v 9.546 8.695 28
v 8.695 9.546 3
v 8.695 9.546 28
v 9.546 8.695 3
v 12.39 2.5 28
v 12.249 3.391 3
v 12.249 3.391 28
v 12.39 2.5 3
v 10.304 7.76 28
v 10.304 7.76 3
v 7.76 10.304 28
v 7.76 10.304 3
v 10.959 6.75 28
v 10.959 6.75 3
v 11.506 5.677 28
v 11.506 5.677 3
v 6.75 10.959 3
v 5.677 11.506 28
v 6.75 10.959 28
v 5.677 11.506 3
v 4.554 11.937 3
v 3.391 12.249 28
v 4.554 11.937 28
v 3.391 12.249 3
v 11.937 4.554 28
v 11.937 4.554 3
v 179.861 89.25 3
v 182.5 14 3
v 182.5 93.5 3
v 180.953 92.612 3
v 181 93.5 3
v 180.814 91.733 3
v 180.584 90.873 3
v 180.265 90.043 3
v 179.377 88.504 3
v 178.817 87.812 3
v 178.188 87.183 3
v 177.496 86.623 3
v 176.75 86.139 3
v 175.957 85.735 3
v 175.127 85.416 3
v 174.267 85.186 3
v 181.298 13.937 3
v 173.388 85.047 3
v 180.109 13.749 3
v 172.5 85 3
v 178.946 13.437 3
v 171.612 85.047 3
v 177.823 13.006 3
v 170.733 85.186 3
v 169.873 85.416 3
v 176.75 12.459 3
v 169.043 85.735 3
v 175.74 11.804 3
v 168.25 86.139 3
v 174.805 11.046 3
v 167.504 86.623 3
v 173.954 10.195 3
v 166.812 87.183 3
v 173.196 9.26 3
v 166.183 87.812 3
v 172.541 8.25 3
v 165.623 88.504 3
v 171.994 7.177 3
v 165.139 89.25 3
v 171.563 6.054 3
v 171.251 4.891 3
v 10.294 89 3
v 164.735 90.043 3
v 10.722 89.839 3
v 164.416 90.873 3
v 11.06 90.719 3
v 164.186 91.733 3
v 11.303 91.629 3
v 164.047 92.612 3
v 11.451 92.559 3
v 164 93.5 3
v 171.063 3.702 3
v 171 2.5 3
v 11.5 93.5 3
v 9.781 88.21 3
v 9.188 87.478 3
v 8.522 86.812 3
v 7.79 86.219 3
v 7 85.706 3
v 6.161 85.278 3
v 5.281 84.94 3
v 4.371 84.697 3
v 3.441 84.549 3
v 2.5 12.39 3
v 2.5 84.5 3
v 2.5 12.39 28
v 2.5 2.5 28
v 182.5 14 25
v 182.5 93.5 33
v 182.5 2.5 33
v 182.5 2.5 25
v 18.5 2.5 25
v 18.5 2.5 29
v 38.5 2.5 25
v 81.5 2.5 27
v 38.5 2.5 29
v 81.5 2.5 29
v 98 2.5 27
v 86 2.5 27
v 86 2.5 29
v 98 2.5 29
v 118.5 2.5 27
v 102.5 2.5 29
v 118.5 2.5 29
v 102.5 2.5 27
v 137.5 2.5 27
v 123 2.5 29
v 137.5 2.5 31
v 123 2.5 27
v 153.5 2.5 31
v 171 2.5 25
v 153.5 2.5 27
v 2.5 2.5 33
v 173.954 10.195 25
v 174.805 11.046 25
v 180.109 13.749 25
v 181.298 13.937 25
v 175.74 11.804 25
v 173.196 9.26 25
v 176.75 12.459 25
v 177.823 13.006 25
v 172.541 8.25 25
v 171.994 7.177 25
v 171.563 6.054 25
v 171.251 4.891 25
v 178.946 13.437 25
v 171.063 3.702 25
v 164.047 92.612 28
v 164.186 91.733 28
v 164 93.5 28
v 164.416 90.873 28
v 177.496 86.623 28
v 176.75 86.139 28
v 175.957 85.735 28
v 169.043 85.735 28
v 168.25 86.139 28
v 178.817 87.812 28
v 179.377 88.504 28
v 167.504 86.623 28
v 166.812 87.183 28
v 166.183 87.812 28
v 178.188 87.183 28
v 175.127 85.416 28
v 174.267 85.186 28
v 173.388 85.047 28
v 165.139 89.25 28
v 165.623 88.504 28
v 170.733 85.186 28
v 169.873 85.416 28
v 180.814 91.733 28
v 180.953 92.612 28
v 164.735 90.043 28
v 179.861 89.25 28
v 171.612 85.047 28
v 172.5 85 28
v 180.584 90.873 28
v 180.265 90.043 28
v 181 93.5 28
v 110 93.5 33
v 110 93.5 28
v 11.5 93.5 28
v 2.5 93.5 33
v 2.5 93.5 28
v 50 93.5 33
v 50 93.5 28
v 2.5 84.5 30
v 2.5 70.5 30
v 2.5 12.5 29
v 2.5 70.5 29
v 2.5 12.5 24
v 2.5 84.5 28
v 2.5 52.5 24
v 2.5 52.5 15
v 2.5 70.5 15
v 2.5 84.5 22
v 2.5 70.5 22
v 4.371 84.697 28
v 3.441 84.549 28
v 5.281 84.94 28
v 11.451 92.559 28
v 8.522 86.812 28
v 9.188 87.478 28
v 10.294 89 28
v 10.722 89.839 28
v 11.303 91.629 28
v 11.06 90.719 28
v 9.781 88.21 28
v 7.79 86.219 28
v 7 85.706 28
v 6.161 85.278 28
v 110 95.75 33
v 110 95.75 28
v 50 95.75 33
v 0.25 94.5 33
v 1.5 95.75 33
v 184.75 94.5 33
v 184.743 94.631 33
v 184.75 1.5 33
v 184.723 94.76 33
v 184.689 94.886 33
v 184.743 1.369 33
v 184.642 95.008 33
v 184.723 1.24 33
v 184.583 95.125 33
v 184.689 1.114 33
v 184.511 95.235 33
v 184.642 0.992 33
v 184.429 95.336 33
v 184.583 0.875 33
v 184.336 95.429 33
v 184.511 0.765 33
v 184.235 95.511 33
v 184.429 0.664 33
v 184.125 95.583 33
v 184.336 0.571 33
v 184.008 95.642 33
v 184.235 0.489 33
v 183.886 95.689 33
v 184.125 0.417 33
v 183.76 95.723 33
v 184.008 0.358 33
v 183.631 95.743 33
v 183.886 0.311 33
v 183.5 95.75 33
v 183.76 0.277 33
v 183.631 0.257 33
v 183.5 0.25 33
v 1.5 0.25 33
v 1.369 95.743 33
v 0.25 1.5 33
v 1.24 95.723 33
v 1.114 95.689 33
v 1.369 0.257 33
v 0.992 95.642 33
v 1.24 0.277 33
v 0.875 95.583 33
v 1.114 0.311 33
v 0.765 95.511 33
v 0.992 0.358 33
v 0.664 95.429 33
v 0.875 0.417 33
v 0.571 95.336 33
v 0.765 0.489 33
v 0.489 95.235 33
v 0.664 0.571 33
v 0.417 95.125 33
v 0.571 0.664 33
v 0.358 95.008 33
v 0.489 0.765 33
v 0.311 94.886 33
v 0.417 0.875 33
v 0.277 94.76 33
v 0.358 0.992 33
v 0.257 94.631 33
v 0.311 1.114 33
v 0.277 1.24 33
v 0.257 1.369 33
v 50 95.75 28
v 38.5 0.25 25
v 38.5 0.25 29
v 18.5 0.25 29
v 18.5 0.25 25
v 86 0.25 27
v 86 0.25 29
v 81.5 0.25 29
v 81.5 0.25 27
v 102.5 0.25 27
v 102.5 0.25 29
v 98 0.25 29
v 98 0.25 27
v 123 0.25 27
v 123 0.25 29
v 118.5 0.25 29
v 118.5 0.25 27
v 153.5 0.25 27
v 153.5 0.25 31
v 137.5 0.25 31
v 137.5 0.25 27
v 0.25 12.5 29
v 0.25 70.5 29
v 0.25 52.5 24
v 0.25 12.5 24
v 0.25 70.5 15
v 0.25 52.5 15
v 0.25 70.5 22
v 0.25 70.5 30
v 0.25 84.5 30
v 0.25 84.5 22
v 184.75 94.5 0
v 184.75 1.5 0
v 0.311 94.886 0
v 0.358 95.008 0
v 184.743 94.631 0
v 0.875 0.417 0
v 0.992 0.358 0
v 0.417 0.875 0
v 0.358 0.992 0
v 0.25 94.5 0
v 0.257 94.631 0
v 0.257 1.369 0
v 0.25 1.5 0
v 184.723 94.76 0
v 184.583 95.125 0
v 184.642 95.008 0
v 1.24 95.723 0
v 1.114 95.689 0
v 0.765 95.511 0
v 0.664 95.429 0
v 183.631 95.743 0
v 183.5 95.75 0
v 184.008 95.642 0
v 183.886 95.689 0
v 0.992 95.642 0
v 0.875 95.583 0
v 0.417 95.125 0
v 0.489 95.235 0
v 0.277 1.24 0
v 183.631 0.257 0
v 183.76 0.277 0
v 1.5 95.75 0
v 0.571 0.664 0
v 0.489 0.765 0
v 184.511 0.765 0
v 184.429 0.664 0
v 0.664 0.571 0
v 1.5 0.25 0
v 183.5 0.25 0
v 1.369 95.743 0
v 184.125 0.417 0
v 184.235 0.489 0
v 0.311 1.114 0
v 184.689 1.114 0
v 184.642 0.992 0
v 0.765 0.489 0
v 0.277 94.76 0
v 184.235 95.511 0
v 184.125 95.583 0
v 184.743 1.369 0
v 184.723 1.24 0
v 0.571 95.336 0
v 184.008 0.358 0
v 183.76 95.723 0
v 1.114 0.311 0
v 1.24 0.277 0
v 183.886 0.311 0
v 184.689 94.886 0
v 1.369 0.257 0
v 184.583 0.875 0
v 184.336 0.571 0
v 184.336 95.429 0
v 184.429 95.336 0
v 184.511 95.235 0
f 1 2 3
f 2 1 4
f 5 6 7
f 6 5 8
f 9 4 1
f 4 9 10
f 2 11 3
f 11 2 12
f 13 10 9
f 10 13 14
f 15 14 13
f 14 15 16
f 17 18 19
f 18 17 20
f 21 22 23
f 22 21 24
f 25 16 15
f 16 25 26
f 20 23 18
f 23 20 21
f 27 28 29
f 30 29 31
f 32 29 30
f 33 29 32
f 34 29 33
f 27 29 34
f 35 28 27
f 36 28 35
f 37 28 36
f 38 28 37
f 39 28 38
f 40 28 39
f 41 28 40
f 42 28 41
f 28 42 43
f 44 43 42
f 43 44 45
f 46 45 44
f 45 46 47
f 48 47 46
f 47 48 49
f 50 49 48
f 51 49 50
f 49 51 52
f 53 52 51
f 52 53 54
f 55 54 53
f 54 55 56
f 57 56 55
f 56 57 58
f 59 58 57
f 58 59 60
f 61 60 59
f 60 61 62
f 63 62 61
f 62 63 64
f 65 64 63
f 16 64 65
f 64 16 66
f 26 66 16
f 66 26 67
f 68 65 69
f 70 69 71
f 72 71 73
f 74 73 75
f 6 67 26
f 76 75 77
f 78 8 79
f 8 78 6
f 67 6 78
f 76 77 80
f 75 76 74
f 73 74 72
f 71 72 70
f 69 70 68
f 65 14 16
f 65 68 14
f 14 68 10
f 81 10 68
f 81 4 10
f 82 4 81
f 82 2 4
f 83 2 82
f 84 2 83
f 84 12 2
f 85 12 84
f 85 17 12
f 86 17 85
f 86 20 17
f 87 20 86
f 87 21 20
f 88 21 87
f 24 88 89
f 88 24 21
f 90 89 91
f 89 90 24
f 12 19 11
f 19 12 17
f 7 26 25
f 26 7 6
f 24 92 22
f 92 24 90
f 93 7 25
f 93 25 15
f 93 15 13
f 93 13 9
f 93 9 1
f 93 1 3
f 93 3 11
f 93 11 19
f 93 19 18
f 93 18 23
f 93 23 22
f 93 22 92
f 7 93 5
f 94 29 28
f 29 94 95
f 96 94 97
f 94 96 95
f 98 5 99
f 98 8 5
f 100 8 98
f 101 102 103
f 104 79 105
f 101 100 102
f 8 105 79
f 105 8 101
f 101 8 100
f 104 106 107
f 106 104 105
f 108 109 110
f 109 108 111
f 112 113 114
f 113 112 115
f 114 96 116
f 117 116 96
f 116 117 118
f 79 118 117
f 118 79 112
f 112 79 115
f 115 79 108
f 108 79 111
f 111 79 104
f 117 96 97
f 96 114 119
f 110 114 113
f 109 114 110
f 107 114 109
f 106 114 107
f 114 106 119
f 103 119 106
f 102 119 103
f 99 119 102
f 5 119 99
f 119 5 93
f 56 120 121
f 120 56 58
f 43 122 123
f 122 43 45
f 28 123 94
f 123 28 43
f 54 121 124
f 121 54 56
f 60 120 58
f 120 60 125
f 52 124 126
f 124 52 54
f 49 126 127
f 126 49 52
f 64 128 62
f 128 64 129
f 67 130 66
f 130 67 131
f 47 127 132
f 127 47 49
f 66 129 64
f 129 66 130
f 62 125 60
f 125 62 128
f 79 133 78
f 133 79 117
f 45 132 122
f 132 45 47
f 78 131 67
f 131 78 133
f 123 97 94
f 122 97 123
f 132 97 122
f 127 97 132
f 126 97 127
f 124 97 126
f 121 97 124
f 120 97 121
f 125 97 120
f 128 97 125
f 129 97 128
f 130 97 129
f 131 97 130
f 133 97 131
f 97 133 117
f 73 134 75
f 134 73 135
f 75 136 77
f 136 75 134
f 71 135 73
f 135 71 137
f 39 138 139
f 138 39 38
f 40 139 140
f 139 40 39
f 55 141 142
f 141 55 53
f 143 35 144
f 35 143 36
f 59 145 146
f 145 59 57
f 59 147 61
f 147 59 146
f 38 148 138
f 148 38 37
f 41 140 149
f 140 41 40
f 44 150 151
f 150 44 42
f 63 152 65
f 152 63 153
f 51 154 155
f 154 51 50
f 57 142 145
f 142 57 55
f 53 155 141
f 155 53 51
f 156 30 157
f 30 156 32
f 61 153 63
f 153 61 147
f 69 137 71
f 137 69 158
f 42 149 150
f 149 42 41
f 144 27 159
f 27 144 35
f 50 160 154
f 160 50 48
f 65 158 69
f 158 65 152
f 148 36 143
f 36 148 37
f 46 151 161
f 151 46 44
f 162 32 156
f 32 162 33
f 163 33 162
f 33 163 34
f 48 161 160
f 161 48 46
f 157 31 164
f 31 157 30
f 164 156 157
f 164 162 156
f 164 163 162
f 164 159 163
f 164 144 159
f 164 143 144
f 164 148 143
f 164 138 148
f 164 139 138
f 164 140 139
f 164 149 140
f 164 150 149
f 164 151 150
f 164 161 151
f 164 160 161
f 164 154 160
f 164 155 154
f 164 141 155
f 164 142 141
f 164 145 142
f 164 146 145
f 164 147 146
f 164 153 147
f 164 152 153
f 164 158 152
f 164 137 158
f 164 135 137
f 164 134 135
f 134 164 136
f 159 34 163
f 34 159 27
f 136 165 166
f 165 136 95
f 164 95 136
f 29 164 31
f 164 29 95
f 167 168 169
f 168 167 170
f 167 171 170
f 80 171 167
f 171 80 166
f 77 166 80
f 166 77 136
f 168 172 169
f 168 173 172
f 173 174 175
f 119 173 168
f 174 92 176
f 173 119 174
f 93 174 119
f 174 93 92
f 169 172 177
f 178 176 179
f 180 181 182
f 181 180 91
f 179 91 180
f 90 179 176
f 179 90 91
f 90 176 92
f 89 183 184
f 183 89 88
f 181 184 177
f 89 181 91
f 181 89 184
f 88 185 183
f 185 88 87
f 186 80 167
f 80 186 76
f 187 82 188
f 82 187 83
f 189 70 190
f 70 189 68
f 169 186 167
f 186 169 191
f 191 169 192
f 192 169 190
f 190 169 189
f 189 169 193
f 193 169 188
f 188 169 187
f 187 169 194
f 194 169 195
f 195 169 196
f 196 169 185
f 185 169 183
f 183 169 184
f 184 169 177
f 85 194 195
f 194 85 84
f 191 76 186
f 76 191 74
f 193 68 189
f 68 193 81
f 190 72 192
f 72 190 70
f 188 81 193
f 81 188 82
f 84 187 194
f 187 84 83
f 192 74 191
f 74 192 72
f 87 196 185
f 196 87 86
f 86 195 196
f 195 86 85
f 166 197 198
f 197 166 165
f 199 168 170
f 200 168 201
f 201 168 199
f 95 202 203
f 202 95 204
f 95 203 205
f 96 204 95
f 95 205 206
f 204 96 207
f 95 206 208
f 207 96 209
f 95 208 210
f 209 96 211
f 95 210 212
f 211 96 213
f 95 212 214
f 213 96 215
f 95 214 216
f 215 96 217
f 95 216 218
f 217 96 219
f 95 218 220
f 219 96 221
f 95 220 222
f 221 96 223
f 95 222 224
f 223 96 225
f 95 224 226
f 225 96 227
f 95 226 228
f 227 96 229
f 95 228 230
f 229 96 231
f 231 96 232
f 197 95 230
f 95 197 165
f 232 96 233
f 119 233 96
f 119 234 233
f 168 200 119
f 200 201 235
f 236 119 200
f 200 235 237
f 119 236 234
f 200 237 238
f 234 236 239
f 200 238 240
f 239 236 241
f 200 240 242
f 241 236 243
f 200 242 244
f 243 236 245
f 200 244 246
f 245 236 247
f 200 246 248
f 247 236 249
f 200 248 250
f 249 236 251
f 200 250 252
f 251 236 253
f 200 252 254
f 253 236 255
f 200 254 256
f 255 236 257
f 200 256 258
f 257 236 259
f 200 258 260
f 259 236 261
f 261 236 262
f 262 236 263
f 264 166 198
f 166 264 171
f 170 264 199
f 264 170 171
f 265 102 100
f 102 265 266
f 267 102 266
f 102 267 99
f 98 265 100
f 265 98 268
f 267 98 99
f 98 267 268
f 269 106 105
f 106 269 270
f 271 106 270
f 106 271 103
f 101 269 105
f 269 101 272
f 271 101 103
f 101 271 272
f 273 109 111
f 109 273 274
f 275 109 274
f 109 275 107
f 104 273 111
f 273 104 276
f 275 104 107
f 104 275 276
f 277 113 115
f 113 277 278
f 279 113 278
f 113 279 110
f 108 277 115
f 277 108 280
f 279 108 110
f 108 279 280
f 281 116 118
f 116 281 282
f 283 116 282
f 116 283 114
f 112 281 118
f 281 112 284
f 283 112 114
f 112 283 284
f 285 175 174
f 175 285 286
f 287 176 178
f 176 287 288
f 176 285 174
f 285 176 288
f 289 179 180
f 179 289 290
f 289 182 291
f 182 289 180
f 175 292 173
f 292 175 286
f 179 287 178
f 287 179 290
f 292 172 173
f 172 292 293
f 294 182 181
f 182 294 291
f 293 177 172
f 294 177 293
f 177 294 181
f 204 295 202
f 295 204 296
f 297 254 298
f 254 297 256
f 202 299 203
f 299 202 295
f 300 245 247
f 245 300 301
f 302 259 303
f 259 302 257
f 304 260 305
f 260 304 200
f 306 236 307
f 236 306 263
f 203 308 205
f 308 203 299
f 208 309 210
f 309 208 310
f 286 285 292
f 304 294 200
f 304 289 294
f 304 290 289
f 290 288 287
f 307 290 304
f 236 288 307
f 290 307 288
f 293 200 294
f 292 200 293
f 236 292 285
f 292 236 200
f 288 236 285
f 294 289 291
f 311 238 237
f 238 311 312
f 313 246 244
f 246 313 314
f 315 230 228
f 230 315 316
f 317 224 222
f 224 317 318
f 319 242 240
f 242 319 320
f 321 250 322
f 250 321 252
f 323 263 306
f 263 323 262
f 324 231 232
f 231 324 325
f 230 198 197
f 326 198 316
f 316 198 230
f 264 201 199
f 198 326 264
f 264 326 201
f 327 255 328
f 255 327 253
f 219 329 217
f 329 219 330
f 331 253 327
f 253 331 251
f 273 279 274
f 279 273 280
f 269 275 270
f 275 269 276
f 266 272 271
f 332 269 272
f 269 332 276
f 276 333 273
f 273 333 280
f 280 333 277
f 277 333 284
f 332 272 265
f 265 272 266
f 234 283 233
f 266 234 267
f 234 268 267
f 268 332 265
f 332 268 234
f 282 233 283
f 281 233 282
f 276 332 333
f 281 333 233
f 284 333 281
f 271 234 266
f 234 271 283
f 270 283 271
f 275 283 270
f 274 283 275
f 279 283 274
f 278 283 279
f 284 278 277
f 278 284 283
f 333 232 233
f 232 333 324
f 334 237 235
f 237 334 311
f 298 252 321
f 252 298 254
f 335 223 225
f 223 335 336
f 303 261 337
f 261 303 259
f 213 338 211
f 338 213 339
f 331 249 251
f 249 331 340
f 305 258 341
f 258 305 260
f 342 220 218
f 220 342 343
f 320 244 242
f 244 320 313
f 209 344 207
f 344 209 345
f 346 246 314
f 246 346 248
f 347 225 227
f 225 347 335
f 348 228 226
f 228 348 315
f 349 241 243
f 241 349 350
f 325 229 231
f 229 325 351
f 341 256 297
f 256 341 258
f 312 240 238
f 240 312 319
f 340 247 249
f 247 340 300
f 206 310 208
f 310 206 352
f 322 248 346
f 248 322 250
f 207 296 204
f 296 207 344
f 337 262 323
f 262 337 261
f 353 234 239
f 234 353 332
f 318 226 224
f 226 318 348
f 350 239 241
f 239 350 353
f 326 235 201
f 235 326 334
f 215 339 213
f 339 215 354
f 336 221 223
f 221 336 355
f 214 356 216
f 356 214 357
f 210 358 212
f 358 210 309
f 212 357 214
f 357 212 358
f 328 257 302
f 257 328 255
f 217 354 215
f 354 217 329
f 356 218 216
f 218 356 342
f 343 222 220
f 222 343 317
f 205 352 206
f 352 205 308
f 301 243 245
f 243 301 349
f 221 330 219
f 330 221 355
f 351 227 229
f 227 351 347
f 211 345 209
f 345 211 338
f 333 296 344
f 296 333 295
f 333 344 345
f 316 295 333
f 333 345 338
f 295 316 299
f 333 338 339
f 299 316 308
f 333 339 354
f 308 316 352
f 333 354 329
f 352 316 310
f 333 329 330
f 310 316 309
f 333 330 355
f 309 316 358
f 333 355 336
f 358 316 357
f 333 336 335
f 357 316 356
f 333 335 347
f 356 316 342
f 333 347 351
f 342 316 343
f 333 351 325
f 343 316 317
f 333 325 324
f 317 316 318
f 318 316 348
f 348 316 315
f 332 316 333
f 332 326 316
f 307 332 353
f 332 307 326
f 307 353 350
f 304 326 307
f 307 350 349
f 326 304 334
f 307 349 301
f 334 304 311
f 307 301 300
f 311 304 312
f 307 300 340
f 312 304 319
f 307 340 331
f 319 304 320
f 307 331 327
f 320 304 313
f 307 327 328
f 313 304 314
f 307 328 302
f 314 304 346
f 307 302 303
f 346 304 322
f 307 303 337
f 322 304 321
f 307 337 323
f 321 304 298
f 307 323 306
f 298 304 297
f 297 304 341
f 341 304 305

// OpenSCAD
/* 
   This is based on a design by mrpickle
   https://www.youmagine.com/designs/librem5-devkit-case
*/

//import("case.stl");

base=3;
wall=2.5;

d=91;
w=180;
h=30;

$fn=60;

module half( h, d, a ) {
    color( "red" )
    rotate([0,0,a])
        difference() {
            cylinder( h, d=d, true );
            union() {
                translate([ -d/2, -d, -1 ]) 
                    cube([d, d,h+2]);
            }
        }
}

module quarter( h, d, a ) {
    color( "red" )
    rotate([0,0,a])
        difference() {
            cylinder( h, d=d, true );
            union() {
                translate([ -1, -d, -1 ]) 
                    cube([d, d,h+2]);
                translate([ -d, -d/2, -1 ]) 
                    cube([d, d,h+2]);
            }
        }
}

translate([1,1,base])
quarter(25, 23, 0);
translate([ w+wall, wall, base] )
    quarter(22, 23, 90);
translate([ 170 + wall, d+wall, base] )
    half(25, 17, 180);
translate([ wall, d+wall, base] )
    quarter(25, 18, 270);

/*
color( "green" )
            translate([0,wall,wall/2])
            rotate([-90, 0,0])
                cylinder( d=wall, 2, true);
            translate([wall,0,wall/2])
            rotate([0, 90,0])
                cylinder( d=wall, 2, true);
*/
color( "red" )
    difference() {
        minkowski() {
            items = 2;
/*            
            translate([0,0,-wall/2])
            rotate([-90, 0,0])
                cylinder( d=wall, 2, false);
            translate([0,0,0])
            rotate([0, 90,0])
                cylinder( d=wall, 2, false);
*/
            translate([0, 0, 0])
                cylinder( d=wall, base, true);
            translate([wall-1, wall-1, 0])
                cube( [w+2, d+2, h ] );
        };
        
        union() {
            // devkit cutout
            translate([wall,wall,base])
                cube( [w, d, h+1 ] );
            translate([47.5+wall,d+wall/2,25+base])
                cube( [60, 4, 5 ] );
            translate([16+wall,-1,22+base])
                cube( [20, 4, 4 ] );
            
            //switches
            translate([79+wall,-1,24+base])
                cube( [4.5, 2*wall, 2] );
            translate([95.5+wall,-1,24+base])
                cube( [4.5, 2*wall, 2] );
            translate([116+wall,-1,24+base])
                cube( [4.5, 2*wall, 2] );
            translate([135+wall,-1,24+base])
                cube( [16, 2*wall, 4] );
            
            // bottom
            translate([-1,10+wall,21+base])
                cube( [wall*2, 70, 5 ] );
            translate([-1,50+wall,12+base])
                cube( [wall*2, 18, 9 ] );
            translate([-1,68+wall,19+base])
                cube( [wall*2, 14, 8 ] );
        }
    }
